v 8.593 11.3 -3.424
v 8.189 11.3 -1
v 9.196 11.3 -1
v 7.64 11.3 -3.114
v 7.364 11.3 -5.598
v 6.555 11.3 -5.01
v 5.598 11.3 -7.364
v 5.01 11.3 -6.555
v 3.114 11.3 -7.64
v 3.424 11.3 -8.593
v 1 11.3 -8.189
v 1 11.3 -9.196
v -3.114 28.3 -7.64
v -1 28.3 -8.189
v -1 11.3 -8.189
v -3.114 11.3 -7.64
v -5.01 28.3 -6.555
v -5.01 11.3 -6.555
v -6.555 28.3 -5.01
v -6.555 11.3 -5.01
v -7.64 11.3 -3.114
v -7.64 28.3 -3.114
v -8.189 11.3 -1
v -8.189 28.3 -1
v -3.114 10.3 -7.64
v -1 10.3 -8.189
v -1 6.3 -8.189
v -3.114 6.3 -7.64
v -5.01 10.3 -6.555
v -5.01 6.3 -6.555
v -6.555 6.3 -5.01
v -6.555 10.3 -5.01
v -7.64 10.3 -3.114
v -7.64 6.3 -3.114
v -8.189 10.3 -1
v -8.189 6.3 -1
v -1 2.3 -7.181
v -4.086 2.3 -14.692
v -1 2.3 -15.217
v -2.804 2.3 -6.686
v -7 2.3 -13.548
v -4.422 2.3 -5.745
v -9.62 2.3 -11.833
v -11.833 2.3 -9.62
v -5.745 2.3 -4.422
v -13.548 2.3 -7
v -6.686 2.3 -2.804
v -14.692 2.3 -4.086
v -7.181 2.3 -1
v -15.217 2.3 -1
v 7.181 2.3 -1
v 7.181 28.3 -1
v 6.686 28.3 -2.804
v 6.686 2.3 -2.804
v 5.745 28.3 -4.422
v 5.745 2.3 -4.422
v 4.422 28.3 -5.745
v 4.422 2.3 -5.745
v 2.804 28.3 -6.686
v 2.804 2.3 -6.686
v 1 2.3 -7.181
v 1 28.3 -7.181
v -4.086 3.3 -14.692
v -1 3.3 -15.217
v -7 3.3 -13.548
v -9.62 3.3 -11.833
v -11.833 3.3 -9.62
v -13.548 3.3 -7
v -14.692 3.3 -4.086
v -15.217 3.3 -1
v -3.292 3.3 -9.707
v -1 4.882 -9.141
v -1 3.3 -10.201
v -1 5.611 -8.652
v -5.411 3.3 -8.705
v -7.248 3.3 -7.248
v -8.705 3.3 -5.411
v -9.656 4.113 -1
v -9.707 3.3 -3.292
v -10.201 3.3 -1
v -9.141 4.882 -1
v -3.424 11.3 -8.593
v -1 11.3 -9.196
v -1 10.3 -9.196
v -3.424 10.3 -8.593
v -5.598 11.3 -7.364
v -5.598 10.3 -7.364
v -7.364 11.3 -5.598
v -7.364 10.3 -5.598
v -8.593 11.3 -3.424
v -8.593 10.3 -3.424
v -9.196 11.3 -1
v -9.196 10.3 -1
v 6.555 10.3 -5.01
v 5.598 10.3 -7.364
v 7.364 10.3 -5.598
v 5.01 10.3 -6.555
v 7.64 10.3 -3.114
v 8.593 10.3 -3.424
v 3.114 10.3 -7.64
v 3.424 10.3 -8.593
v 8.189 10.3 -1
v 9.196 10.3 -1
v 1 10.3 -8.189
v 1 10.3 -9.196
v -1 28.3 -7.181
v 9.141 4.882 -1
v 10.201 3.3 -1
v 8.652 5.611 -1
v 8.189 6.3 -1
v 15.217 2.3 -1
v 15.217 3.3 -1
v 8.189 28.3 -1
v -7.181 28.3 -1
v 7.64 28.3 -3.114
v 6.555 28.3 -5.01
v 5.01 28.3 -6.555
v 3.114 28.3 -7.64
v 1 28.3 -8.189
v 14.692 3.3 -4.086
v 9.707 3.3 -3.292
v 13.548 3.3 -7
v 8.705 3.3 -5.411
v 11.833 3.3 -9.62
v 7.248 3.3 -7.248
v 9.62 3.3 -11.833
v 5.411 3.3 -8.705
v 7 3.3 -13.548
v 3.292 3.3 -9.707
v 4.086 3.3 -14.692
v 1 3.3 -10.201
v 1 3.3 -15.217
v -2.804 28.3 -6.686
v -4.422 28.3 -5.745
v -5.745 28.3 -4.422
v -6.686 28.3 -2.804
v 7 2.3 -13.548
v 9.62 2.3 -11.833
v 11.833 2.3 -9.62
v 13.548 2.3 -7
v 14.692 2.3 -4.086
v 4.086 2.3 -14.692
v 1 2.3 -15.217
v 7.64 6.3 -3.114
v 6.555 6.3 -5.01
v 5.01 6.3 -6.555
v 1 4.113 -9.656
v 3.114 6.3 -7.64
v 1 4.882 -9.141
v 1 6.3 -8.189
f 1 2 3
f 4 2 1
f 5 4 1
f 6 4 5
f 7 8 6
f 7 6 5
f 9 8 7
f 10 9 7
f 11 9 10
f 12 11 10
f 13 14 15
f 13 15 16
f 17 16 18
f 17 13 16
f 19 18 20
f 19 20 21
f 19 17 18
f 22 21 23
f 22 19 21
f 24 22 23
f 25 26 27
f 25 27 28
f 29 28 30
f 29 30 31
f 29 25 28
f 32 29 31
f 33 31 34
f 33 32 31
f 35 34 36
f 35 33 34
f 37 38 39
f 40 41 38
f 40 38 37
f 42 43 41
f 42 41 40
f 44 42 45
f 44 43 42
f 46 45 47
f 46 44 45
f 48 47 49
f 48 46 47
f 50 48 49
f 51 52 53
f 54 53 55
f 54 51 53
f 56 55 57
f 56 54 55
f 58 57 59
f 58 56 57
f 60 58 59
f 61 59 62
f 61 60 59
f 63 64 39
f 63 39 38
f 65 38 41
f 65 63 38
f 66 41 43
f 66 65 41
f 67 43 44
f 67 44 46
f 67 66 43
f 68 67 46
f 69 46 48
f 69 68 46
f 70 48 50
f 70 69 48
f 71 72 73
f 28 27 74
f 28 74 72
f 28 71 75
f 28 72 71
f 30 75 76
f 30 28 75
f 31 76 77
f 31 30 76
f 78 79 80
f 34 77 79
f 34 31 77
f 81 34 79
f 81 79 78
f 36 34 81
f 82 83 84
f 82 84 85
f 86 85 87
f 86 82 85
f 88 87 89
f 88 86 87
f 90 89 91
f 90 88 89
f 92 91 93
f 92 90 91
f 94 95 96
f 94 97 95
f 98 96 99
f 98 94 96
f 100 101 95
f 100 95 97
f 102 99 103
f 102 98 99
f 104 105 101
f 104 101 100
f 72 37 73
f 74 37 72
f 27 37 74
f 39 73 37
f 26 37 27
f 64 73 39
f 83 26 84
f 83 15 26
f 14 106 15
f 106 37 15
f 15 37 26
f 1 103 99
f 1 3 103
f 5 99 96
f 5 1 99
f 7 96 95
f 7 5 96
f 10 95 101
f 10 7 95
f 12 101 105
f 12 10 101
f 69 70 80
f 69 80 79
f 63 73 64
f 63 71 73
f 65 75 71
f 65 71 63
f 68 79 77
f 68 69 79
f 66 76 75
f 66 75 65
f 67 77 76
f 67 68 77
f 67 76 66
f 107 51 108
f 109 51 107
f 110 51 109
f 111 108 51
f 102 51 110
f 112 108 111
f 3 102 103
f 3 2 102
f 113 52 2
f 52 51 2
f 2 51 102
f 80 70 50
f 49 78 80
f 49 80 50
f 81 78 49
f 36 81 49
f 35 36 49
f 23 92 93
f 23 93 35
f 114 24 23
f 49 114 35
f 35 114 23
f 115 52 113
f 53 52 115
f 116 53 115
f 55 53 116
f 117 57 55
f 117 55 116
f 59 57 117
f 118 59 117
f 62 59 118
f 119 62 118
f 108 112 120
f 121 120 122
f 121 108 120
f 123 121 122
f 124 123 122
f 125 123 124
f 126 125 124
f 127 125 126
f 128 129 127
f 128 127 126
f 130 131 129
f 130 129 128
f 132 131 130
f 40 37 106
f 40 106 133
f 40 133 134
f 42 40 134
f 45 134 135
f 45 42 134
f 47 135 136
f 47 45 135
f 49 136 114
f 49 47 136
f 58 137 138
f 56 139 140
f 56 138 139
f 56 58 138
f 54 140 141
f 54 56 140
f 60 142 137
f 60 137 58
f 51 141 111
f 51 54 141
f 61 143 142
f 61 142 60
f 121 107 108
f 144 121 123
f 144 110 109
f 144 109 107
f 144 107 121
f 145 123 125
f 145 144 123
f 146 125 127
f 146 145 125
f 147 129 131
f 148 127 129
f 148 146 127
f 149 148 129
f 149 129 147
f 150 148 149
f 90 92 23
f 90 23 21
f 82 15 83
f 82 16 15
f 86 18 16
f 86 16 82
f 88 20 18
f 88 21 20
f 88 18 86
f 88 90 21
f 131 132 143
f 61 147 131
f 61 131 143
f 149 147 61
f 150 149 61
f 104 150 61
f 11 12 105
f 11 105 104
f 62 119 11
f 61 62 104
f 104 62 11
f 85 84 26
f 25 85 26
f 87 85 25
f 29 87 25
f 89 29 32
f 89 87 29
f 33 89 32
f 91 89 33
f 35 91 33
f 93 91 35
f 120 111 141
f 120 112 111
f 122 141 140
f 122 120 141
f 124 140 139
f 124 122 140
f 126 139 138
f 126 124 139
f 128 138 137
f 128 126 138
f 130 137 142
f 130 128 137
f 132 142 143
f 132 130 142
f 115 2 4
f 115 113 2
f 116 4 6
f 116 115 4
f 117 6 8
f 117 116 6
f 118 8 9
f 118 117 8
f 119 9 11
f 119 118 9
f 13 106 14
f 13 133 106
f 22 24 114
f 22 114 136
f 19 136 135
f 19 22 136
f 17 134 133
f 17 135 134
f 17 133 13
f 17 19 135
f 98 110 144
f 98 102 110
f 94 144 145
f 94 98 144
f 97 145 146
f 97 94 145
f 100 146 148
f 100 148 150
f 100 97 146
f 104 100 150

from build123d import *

# Parameters (mm, degrees)
EXTRUDE012_DEPTH = 30


with BuildPart() as extrude012:
    # Sketch016 → Extrude012 (new body)
    with BuildSketch(Plane(origin=(0, 29, 0), x_dir=(-1, 0, 0), z_dir=(0, 1, 0))):
        Polygon((-16, 16), (16, 16), (16, -1), (1, -1), (1, -16), (-1, -16), (-1, -1), (-16, -1), align=None)
    extrude(amount=-EXTRUDE012_DEPTH)


with BuildPart() as cf_clamp:
    # Sketch015 → Revolve (revolve)
    with BuildSketch(Plane(origin=(0, 0, 0), x_dir=(0, -1, 0), z_dir=(-1, 0, 0))):
        Polygon((-28.3, -7.25), (-2.3, -7.25), (-2.3, -15.25), (-3.3, -15.25), (-3.3, -10.25), (-6.3, -8.25), (-10.3, -8.25), (-10.3, -9.25), (-11.3, -9.25), (-11.3, -8.25), (-28.3, -8.25), align=None)
    revolve(axis=Axis((0, 0, 0), (0, 1, 0)))

    # Cut005: cut Extrude012
    add(extrude012.part, mode=Mode.SUBTRACT)


solid = cf_clamp.part
